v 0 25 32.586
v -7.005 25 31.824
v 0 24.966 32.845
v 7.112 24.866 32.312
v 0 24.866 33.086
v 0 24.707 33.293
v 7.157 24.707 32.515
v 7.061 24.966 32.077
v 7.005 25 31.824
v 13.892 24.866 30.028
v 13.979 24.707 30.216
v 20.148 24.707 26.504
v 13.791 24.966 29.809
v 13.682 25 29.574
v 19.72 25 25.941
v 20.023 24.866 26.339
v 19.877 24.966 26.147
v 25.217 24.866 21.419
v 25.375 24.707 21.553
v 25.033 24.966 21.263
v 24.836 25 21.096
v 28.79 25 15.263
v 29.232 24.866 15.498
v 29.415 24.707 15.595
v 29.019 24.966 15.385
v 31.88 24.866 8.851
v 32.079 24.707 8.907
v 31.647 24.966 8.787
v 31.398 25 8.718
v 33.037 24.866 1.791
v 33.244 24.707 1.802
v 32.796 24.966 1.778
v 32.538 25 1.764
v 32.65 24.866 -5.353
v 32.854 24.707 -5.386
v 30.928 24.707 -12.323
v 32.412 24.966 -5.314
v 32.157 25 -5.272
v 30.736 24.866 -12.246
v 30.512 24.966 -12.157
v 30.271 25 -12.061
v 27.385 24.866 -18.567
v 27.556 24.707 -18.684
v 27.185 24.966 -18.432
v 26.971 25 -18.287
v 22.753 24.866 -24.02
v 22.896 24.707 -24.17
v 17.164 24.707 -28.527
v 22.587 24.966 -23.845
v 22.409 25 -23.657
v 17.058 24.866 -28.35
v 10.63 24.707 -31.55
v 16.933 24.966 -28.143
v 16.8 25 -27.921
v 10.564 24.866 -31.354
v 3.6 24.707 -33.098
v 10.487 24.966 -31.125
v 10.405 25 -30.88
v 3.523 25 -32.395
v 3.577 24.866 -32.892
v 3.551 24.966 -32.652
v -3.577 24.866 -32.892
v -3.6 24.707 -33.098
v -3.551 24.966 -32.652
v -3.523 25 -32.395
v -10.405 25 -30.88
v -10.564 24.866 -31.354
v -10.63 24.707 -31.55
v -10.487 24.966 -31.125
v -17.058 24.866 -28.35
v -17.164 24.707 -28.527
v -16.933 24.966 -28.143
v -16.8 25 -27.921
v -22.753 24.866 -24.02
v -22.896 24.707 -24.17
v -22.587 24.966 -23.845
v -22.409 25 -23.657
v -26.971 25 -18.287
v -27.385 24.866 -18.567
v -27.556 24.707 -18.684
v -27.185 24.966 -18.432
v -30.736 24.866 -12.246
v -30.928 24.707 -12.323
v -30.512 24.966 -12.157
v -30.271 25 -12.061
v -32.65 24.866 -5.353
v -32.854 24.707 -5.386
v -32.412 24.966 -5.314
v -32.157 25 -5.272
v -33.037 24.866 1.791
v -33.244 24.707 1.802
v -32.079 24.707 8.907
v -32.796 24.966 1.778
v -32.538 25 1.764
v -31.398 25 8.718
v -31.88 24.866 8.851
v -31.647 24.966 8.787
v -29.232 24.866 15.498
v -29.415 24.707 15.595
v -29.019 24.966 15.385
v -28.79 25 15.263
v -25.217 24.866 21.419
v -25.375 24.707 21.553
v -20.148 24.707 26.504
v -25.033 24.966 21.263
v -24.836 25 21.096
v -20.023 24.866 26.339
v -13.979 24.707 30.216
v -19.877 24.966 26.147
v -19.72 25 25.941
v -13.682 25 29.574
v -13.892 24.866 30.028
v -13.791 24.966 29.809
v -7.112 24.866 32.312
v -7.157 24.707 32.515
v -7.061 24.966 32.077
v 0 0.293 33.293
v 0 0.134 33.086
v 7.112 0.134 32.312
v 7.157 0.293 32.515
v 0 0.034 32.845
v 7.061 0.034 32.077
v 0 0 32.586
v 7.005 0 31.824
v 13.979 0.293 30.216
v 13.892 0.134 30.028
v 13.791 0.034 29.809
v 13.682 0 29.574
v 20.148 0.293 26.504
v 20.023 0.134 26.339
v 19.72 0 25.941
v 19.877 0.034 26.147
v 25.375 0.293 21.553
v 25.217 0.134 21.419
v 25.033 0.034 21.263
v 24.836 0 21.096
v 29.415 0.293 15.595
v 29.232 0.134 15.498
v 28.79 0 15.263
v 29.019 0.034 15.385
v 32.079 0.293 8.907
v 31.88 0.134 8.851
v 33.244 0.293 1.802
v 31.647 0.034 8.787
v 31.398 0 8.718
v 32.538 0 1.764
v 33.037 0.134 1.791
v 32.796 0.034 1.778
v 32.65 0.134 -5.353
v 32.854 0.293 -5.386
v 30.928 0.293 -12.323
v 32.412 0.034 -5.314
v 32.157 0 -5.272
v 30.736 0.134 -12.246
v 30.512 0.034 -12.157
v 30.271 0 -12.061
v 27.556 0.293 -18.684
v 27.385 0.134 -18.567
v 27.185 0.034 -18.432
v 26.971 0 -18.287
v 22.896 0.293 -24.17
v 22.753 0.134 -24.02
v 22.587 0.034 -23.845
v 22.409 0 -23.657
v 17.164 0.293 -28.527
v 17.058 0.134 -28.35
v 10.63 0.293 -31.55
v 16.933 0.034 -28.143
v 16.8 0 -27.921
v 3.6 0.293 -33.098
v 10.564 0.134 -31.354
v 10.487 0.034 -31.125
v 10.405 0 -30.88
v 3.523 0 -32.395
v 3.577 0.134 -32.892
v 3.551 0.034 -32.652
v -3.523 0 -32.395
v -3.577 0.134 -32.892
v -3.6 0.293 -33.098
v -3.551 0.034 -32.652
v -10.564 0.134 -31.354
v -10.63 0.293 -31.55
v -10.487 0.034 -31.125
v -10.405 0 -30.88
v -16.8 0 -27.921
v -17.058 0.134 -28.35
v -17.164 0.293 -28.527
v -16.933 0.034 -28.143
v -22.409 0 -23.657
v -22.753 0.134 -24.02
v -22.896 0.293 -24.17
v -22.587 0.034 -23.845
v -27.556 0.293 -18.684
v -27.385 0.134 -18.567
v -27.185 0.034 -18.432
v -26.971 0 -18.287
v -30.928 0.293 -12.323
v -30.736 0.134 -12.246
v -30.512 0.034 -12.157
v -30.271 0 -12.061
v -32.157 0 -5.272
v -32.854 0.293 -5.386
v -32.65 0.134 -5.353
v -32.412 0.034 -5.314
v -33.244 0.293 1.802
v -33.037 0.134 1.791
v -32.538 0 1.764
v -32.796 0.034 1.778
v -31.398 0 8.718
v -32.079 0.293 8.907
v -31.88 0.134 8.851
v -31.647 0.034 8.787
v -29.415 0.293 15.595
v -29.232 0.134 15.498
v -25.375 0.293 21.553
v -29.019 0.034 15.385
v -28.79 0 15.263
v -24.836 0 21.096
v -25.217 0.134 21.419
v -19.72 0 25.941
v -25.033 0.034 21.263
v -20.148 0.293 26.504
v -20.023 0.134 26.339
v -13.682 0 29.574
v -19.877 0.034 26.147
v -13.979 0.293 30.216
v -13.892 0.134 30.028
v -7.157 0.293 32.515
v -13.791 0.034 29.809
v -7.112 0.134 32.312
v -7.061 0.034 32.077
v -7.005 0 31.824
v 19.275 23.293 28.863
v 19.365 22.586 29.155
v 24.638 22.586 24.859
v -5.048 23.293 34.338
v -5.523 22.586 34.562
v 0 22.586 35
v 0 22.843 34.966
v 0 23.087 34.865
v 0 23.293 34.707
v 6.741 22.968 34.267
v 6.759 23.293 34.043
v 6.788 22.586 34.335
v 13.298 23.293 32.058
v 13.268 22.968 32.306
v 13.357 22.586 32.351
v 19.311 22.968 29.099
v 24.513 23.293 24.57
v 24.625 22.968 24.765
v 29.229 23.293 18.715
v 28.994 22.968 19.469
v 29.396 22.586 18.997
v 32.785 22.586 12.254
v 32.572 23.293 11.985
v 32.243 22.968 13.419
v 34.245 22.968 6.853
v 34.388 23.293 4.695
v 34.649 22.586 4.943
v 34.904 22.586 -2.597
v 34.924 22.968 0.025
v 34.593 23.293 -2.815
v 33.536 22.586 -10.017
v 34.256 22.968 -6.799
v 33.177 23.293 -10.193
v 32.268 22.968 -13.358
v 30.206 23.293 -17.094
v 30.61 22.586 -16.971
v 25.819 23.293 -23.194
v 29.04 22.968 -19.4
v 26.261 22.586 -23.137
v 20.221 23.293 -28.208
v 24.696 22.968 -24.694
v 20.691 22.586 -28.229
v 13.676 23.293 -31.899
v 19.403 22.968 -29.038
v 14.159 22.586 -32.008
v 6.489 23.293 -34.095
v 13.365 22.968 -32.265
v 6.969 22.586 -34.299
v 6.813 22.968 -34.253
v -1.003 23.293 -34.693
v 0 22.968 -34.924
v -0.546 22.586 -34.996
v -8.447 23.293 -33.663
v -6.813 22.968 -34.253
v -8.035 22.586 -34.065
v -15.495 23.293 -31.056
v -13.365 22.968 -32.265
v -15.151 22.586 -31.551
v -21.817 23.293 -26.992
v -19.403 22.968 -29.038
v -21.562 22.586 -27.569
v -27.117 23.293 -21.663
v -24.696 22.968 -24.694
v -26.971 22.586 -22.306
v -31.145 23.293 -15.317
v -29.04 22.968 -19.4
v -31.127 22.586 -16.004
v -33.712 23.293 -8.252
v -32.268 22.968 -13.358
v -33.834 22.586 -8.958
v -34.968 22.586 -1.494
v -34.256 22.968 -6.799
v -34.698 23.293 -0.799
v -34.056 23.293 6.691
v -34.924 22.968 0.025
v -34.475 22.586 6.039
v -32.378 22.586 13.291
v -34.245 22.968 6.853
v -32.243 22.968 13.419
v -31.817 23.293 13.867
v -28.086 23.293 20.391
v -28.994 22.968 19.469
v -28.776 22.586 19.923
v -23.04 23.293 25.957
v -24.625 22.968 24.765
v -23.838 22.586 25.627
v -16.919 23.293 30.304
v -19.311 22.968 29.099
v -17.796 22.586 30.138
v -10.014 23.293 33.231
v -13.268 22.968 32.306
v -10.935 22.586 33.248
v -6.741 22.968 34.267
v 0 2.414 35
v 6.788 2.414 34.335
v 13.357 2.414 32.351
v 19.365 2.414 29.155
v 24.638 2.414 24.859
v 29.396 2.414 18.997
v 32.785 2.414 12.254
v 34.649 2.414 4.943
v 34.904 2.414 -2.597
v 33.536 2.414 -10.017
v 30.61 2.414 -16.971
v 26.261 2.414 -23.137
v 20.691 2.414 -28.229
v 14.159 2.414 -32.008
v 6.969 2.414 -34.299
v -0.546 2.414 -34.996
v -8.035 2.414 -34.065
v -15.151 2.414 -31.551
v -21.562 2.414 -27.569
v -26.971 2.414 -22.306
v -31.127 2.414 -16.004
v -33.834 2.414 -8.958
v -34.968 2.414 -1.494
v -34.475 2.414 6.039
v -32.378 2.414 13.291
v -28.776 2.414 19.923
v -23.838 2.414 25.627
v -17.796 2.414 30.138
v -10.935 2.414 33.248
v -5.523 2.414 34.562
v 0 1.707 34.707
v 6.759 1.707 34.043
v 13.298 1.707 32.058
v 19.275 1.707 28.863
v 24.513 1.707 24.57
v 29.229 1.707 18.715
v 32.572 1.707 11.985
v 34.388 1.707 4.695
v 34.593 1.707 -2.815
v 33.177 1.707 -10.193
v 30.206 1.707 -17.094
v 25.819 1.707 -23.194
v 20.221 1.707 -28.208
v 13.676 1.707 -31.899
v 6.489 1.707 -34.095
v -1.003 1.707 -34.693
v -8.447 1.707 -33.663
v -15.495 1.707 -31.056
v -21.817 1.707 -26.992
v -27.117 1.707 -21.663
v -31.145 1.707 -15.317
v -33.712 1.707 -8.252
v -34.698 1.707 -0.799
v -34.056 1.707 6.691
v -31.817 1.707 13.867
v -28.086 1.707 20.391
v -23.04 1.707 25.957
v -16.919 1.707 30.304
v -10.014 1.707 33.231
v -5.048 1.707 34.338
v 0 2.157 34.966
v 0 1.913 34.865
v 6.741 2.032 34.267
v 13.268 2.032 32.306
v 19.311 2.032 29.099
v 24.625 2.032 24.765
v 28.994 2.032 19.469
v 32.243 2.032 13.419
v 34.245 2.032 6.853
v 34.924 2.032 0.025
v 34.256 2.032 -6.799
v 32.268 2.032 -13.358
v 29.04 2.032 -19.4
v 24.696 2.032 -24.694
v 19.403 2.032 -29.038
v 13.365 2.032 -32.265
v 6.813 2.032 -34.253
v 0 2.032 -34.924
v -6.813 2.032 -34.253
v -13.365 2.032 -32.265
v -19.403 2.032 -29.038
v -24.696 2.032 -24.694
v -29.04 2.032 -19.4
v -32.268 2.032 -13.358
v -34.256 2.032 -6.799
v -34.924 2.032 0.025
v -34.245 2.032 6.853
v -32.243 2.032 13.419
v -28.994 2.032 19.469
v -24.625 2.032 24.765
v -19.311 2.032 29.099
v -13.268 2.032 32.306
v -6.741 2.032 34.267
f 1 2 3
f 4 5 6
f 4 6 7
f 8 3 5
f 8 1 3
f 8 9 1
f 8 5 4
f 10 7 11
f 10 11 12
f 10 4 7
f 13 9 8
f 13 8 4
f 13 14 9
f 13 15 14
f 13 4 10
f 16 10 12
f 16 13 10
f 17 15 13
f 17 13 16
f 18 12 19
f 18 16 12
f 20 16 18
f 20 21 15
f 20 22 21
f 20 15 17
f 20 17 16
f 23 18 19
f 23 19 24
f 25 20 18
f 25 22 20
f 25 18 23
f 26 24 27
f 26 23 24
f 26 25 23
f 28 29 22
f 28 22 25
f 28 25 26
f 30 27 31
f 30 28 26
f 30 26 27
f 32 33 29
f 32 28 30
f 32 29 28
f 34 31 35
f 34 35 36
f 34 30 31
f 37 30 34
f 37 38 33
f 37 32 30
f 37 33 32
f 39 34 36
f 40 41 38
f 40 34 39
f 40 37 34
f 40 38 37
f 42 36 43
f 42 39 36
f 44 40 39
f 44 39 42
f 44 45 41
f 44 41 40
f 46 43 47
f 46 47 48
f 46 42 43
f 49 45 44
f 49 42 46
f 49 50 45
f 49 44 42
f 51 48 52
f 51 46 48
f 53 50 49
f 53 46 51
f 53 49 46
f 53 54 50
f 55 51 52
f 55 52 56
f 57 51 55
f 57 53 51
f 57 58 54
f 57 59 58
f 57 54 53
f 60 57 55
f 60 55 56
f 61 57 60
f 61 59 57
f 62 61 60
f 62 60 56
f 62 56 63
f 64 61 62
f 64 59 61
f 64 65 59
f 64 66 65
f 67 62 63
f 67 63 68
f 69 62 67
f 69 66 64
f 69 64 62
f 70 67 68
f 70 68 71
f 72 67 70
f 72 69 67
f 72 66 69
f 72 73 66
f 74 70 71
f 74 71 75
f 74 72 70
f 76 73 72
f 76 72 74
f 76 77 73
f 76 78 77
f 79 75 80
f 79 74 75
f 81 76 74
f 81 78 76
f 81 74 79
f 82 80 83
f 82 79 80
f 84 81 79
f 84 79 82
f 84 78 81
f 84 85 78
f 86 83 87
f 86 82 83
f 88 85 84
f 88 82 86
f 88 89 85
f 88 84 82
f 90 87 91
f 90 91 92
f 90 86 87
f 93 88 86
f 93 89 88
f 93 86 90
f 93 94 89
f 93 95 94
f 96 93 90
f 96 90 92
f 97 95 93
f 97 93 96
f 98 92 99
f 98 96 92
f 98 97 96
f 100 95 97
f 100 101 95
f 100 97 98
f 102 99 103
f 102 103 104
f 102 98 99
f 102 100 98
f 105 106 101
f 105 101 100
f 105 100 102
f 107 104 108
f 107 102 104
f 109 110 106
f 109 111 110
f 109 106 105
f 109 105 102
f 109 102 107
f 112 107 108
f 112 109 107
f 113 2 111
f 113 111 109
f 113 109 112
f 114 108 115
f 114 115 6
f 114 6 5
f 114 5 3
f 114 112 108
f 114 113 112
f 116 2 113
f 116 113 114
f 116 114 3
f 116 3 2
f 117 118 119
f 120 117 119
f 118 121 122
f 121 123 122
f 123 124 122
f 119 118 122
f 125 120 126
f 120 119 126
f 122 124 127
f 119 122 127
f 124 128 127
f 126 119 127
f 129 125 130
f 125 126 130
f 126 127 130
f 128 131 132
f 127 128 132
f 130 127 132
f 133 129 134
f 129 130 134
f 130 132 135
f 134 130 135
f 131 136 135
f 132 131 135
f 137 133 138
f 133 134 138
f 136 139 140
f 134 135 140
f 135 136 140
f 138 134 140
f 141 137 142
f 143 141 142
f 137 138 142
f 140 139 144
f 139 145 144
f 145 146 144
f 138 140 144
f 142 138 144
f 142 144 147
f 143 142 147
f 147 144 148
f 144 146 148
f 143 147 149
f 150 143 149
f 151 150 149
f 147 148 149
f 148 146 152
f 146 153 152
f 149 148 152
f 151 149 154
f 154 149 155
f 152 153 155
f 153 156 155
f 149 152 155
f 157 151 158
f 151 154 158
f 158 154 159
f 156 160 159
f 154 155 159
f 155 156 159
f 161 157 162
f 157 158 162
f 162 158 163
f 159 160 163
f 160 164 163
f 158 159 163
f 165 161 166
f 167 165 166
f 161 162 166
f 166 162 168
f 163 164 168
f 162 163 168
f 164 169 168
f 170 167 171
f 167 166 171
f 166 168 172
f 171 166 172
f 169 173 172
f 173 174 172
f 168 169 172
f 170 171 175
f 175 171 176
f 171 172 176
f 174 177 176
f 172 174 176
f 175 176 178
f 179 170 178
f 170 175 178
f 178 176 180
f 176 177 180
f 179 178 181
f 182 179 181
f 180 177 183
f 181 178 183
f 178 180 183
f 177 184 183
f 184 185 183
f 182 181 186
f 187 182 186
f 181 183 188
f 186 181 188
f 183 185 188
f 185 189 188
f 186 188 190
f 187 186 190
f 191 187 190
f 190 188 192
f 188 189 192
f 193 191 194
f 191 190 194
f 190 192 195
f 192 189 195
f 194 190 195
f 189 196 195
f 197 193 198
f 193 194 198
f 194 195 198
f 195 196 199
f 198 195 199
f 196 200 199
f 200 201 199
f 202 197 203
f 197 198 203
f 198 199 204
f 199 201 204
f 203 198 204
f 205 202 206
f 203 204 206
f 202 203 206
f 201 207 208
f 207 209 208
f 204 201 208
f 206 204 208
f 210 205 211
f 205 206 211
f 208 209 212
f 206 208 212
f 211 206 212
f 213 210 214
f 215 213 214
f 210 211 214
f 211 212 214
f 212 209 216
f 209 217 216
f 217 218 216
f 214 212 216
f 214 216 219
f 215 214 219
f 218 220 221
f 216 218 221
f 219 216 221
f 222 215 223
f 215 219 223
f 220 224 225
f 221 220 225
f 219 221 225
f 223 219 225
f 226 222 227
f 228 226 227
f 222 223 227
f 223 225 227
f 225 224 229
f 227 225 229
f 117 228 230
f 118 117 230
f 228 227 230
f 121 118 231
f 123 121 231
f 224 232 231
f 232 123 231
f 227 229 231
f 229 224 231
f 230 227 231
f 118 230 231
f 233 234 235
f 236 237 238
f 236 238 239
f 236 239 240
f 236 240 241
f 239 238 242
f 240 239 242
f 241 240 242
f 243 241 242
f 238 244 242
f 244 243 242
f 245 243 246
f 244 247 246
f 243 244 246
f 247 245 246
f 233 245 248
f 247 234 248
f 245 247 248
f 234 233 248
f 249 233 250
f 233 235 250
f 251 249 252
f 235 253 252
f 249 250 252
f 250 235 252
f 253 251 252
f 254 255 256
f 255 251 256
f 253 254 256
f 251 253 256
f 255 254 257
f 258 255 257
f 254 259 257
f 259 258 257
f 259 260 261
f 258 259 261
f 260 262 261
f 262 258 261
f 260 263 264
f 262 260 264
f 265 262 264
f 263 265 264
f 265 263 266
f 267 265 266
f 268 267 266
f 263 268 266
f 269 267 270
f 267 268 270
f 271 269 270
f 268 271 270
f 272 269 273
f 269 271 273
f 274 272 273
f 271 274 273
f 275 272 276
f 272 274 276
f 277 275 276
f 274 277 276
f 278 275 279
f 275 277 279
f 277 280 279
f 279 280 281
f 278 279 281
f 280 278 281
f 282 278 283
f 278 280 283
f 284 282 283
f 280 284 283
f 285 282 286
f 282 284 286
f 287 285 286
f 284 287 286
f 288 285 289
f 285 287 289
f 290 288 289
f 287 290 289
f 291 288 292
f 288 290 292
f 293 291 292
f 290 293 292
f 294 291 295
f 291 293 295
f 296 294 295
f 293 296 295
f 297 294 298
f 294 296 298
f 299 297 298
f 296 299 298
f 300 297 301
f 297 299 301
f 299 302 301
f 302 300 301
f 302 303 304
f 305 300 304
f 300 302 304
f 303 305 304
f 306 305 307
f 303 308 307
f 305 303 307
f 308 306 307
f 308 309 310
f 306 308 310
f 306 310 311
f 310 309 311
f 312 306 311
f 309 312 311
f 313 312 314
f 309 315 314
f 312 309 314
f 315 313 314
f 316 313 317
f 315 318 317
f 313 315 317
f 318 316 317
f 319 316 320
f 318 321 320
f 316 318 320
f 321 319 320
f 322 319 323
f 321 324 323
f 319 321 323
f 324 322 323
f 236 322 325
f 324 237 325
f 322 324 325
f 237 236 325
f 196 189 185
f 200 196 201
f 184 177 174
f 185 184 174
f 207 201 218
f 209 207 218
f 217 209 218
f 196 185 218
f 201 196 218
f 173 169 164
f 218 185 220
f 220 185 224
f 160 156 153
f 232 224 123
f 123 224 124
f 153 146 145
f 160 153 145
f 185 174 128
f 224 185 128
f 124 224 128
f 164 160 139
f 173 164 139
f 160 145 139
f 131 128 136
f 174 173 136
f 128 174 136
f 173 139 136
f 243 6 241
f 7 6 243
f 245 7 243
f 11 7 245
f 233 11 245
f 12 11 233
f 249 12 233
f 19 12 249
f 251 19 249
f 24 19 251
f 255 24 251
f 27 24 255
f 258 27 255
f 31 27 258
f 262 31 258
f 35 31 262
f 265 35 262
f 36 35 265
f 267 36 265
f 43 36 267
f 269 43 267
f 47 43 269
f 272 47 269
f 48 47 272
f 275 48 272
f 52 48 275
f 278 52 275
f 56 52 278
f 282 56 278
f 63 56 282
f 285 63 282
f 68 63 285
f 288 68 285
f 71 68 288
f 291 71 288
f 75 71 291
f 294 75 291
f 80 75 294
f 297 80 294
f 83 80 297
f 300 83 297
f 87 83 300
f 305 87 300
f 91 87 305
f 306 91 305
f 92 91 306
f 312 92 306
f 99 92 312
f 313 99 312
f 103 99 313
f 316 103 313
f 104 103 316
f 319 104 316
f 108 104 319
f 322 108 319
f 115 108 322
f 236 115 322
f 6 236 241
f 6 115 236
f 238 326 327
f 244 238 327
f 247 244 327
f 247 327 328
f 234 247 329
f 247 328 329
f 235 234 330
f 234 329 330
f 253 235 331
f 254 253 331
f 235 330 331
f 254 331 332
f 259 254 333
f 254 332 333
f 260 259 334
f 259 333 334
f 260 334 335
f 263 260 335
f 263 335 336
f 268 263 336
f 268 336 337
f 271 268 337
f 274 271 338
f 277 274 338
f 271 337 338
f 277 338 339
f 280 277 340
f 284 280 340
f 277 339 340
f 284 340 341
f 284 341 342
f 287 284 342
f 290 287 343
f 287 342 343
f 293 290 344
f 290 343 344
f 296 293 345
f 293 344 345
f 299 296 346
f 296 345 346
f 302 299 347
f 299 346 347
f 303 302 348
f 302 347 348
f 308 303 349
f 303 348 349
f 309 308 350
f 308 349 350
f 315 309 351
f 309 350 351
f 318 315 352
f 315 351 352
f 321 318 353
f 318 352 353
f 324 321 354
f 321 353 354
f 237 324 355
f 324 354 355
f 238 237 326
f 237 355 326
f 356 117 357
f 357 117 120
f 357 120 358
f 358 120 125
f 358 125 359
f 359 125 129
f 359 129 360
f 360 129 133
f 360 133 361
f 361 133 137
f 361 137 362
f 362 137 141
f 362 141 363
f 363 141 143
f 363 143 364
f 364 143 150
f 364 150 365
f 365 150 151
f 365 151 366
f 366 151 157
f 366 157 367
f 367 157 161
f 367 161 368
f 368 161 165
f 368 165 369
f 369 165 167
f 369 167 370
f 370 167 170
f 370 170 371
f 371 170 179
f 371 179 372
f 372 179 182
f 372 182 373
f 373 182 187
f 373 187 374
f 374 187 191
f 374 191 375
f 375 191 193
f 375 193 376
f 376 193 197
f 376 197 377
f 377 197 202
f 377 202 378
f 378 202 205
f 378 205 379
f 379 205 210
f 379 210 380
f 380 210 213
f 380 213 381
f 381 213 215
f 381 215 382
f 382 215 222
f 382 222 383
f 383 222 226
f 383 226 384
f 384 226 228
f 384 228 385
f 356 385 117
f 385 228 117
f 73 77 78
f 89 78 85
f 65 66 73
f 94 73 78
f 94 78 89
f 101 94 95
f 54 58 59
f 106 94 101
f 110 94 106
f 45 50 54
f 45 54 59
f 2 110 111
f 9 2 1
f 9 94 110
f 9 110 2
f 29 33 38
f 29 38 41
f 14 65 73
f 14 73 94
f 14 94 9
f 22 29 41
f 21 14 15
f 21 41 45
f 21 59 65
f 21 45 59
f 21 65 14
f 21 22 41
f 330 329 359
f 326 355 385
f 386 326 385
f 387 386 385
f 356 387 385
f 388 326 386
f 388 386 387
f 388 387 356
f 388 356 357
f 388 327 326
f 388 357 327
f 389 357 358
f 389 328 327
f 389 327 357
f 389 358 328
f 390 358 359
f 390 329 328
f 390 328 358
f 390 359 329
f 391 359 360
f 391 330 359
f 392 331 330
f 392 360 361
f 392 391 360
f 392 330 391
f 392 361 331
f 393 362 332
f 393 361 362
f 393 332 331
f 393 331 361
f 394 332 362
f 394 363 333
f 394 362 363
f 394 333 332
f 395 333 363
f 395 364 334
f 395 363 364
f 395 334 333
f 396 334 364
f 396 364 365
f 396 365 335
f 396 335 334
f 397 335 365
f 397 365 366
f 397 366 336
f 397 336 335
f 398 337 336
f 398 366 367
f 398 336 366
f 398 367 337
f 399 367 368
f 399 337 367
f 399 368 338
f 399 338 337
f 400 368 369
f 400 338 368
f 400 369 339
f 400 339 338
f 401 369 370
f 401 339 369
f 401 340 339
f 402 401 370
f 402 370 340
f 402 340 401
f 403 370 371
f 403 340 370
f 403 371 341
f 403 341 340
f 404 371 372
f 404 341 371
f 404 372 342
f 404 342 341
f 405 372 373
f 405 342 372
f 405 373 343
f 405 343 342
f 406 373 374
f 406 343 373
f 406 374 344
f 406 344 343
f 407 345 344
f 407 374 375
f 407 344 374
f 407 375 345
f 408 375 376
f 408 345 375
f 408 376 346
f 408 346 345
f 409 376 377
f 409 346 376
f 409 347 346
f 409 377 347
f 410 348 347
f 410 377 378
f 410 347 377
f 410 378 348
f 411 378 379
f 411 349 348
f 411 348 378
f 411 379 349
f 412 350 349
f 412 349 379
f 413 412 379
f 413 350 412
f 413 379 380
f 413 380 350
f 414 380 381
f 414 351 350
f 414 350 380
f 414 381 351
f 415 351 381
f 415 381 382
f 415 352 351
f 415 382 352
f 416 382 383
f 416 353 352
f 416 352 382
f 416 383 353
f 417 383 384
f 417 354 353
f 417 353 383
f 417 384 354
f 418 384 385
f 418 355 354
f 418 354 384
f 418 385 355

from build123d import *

# Parameters (mm, degrees)
SKETCH1_R           = 35
BOSS_EXTRUDE1_DEPTH = 25
CHAMFER1_SIZE       = 2
FILLET2_R           = 1


with BuildPart() as part:
    # Sketch1 → Boss-Extrude1 (new body)
    with BuildSketch(Plane(origin=(0, 0, 0), x_dir=(1, 0, 0), z_dir=(0, 1, 0))):
        with Locations(Location((0, 0, 0), (0, 0, 270))):
            Circle(SKETCH1_R)
    extrude(amount=BOSS_EXTRUDE1_DEPTH)

    # Chamfer1
    chamfer1_edges = [part.edges().sort_by_distance(p)[0] for p in [
        (0, 0, -35),
        (0, 25, -35),
    ]]
    chamfer(chamfer1_edges, length=CHAMFER1_SIZE)

    # Fillet2
    fillet2_edges = [part.edges().sort_by_distance(p)[0] for p in [
        (0, 23, -35),
        (0, 2, -35),
        (0, 0, -33),
        (0, 25, -33),
    ]]
    fillet(fillet2_edges, radius=FILLET2_R)


solid = part.part
